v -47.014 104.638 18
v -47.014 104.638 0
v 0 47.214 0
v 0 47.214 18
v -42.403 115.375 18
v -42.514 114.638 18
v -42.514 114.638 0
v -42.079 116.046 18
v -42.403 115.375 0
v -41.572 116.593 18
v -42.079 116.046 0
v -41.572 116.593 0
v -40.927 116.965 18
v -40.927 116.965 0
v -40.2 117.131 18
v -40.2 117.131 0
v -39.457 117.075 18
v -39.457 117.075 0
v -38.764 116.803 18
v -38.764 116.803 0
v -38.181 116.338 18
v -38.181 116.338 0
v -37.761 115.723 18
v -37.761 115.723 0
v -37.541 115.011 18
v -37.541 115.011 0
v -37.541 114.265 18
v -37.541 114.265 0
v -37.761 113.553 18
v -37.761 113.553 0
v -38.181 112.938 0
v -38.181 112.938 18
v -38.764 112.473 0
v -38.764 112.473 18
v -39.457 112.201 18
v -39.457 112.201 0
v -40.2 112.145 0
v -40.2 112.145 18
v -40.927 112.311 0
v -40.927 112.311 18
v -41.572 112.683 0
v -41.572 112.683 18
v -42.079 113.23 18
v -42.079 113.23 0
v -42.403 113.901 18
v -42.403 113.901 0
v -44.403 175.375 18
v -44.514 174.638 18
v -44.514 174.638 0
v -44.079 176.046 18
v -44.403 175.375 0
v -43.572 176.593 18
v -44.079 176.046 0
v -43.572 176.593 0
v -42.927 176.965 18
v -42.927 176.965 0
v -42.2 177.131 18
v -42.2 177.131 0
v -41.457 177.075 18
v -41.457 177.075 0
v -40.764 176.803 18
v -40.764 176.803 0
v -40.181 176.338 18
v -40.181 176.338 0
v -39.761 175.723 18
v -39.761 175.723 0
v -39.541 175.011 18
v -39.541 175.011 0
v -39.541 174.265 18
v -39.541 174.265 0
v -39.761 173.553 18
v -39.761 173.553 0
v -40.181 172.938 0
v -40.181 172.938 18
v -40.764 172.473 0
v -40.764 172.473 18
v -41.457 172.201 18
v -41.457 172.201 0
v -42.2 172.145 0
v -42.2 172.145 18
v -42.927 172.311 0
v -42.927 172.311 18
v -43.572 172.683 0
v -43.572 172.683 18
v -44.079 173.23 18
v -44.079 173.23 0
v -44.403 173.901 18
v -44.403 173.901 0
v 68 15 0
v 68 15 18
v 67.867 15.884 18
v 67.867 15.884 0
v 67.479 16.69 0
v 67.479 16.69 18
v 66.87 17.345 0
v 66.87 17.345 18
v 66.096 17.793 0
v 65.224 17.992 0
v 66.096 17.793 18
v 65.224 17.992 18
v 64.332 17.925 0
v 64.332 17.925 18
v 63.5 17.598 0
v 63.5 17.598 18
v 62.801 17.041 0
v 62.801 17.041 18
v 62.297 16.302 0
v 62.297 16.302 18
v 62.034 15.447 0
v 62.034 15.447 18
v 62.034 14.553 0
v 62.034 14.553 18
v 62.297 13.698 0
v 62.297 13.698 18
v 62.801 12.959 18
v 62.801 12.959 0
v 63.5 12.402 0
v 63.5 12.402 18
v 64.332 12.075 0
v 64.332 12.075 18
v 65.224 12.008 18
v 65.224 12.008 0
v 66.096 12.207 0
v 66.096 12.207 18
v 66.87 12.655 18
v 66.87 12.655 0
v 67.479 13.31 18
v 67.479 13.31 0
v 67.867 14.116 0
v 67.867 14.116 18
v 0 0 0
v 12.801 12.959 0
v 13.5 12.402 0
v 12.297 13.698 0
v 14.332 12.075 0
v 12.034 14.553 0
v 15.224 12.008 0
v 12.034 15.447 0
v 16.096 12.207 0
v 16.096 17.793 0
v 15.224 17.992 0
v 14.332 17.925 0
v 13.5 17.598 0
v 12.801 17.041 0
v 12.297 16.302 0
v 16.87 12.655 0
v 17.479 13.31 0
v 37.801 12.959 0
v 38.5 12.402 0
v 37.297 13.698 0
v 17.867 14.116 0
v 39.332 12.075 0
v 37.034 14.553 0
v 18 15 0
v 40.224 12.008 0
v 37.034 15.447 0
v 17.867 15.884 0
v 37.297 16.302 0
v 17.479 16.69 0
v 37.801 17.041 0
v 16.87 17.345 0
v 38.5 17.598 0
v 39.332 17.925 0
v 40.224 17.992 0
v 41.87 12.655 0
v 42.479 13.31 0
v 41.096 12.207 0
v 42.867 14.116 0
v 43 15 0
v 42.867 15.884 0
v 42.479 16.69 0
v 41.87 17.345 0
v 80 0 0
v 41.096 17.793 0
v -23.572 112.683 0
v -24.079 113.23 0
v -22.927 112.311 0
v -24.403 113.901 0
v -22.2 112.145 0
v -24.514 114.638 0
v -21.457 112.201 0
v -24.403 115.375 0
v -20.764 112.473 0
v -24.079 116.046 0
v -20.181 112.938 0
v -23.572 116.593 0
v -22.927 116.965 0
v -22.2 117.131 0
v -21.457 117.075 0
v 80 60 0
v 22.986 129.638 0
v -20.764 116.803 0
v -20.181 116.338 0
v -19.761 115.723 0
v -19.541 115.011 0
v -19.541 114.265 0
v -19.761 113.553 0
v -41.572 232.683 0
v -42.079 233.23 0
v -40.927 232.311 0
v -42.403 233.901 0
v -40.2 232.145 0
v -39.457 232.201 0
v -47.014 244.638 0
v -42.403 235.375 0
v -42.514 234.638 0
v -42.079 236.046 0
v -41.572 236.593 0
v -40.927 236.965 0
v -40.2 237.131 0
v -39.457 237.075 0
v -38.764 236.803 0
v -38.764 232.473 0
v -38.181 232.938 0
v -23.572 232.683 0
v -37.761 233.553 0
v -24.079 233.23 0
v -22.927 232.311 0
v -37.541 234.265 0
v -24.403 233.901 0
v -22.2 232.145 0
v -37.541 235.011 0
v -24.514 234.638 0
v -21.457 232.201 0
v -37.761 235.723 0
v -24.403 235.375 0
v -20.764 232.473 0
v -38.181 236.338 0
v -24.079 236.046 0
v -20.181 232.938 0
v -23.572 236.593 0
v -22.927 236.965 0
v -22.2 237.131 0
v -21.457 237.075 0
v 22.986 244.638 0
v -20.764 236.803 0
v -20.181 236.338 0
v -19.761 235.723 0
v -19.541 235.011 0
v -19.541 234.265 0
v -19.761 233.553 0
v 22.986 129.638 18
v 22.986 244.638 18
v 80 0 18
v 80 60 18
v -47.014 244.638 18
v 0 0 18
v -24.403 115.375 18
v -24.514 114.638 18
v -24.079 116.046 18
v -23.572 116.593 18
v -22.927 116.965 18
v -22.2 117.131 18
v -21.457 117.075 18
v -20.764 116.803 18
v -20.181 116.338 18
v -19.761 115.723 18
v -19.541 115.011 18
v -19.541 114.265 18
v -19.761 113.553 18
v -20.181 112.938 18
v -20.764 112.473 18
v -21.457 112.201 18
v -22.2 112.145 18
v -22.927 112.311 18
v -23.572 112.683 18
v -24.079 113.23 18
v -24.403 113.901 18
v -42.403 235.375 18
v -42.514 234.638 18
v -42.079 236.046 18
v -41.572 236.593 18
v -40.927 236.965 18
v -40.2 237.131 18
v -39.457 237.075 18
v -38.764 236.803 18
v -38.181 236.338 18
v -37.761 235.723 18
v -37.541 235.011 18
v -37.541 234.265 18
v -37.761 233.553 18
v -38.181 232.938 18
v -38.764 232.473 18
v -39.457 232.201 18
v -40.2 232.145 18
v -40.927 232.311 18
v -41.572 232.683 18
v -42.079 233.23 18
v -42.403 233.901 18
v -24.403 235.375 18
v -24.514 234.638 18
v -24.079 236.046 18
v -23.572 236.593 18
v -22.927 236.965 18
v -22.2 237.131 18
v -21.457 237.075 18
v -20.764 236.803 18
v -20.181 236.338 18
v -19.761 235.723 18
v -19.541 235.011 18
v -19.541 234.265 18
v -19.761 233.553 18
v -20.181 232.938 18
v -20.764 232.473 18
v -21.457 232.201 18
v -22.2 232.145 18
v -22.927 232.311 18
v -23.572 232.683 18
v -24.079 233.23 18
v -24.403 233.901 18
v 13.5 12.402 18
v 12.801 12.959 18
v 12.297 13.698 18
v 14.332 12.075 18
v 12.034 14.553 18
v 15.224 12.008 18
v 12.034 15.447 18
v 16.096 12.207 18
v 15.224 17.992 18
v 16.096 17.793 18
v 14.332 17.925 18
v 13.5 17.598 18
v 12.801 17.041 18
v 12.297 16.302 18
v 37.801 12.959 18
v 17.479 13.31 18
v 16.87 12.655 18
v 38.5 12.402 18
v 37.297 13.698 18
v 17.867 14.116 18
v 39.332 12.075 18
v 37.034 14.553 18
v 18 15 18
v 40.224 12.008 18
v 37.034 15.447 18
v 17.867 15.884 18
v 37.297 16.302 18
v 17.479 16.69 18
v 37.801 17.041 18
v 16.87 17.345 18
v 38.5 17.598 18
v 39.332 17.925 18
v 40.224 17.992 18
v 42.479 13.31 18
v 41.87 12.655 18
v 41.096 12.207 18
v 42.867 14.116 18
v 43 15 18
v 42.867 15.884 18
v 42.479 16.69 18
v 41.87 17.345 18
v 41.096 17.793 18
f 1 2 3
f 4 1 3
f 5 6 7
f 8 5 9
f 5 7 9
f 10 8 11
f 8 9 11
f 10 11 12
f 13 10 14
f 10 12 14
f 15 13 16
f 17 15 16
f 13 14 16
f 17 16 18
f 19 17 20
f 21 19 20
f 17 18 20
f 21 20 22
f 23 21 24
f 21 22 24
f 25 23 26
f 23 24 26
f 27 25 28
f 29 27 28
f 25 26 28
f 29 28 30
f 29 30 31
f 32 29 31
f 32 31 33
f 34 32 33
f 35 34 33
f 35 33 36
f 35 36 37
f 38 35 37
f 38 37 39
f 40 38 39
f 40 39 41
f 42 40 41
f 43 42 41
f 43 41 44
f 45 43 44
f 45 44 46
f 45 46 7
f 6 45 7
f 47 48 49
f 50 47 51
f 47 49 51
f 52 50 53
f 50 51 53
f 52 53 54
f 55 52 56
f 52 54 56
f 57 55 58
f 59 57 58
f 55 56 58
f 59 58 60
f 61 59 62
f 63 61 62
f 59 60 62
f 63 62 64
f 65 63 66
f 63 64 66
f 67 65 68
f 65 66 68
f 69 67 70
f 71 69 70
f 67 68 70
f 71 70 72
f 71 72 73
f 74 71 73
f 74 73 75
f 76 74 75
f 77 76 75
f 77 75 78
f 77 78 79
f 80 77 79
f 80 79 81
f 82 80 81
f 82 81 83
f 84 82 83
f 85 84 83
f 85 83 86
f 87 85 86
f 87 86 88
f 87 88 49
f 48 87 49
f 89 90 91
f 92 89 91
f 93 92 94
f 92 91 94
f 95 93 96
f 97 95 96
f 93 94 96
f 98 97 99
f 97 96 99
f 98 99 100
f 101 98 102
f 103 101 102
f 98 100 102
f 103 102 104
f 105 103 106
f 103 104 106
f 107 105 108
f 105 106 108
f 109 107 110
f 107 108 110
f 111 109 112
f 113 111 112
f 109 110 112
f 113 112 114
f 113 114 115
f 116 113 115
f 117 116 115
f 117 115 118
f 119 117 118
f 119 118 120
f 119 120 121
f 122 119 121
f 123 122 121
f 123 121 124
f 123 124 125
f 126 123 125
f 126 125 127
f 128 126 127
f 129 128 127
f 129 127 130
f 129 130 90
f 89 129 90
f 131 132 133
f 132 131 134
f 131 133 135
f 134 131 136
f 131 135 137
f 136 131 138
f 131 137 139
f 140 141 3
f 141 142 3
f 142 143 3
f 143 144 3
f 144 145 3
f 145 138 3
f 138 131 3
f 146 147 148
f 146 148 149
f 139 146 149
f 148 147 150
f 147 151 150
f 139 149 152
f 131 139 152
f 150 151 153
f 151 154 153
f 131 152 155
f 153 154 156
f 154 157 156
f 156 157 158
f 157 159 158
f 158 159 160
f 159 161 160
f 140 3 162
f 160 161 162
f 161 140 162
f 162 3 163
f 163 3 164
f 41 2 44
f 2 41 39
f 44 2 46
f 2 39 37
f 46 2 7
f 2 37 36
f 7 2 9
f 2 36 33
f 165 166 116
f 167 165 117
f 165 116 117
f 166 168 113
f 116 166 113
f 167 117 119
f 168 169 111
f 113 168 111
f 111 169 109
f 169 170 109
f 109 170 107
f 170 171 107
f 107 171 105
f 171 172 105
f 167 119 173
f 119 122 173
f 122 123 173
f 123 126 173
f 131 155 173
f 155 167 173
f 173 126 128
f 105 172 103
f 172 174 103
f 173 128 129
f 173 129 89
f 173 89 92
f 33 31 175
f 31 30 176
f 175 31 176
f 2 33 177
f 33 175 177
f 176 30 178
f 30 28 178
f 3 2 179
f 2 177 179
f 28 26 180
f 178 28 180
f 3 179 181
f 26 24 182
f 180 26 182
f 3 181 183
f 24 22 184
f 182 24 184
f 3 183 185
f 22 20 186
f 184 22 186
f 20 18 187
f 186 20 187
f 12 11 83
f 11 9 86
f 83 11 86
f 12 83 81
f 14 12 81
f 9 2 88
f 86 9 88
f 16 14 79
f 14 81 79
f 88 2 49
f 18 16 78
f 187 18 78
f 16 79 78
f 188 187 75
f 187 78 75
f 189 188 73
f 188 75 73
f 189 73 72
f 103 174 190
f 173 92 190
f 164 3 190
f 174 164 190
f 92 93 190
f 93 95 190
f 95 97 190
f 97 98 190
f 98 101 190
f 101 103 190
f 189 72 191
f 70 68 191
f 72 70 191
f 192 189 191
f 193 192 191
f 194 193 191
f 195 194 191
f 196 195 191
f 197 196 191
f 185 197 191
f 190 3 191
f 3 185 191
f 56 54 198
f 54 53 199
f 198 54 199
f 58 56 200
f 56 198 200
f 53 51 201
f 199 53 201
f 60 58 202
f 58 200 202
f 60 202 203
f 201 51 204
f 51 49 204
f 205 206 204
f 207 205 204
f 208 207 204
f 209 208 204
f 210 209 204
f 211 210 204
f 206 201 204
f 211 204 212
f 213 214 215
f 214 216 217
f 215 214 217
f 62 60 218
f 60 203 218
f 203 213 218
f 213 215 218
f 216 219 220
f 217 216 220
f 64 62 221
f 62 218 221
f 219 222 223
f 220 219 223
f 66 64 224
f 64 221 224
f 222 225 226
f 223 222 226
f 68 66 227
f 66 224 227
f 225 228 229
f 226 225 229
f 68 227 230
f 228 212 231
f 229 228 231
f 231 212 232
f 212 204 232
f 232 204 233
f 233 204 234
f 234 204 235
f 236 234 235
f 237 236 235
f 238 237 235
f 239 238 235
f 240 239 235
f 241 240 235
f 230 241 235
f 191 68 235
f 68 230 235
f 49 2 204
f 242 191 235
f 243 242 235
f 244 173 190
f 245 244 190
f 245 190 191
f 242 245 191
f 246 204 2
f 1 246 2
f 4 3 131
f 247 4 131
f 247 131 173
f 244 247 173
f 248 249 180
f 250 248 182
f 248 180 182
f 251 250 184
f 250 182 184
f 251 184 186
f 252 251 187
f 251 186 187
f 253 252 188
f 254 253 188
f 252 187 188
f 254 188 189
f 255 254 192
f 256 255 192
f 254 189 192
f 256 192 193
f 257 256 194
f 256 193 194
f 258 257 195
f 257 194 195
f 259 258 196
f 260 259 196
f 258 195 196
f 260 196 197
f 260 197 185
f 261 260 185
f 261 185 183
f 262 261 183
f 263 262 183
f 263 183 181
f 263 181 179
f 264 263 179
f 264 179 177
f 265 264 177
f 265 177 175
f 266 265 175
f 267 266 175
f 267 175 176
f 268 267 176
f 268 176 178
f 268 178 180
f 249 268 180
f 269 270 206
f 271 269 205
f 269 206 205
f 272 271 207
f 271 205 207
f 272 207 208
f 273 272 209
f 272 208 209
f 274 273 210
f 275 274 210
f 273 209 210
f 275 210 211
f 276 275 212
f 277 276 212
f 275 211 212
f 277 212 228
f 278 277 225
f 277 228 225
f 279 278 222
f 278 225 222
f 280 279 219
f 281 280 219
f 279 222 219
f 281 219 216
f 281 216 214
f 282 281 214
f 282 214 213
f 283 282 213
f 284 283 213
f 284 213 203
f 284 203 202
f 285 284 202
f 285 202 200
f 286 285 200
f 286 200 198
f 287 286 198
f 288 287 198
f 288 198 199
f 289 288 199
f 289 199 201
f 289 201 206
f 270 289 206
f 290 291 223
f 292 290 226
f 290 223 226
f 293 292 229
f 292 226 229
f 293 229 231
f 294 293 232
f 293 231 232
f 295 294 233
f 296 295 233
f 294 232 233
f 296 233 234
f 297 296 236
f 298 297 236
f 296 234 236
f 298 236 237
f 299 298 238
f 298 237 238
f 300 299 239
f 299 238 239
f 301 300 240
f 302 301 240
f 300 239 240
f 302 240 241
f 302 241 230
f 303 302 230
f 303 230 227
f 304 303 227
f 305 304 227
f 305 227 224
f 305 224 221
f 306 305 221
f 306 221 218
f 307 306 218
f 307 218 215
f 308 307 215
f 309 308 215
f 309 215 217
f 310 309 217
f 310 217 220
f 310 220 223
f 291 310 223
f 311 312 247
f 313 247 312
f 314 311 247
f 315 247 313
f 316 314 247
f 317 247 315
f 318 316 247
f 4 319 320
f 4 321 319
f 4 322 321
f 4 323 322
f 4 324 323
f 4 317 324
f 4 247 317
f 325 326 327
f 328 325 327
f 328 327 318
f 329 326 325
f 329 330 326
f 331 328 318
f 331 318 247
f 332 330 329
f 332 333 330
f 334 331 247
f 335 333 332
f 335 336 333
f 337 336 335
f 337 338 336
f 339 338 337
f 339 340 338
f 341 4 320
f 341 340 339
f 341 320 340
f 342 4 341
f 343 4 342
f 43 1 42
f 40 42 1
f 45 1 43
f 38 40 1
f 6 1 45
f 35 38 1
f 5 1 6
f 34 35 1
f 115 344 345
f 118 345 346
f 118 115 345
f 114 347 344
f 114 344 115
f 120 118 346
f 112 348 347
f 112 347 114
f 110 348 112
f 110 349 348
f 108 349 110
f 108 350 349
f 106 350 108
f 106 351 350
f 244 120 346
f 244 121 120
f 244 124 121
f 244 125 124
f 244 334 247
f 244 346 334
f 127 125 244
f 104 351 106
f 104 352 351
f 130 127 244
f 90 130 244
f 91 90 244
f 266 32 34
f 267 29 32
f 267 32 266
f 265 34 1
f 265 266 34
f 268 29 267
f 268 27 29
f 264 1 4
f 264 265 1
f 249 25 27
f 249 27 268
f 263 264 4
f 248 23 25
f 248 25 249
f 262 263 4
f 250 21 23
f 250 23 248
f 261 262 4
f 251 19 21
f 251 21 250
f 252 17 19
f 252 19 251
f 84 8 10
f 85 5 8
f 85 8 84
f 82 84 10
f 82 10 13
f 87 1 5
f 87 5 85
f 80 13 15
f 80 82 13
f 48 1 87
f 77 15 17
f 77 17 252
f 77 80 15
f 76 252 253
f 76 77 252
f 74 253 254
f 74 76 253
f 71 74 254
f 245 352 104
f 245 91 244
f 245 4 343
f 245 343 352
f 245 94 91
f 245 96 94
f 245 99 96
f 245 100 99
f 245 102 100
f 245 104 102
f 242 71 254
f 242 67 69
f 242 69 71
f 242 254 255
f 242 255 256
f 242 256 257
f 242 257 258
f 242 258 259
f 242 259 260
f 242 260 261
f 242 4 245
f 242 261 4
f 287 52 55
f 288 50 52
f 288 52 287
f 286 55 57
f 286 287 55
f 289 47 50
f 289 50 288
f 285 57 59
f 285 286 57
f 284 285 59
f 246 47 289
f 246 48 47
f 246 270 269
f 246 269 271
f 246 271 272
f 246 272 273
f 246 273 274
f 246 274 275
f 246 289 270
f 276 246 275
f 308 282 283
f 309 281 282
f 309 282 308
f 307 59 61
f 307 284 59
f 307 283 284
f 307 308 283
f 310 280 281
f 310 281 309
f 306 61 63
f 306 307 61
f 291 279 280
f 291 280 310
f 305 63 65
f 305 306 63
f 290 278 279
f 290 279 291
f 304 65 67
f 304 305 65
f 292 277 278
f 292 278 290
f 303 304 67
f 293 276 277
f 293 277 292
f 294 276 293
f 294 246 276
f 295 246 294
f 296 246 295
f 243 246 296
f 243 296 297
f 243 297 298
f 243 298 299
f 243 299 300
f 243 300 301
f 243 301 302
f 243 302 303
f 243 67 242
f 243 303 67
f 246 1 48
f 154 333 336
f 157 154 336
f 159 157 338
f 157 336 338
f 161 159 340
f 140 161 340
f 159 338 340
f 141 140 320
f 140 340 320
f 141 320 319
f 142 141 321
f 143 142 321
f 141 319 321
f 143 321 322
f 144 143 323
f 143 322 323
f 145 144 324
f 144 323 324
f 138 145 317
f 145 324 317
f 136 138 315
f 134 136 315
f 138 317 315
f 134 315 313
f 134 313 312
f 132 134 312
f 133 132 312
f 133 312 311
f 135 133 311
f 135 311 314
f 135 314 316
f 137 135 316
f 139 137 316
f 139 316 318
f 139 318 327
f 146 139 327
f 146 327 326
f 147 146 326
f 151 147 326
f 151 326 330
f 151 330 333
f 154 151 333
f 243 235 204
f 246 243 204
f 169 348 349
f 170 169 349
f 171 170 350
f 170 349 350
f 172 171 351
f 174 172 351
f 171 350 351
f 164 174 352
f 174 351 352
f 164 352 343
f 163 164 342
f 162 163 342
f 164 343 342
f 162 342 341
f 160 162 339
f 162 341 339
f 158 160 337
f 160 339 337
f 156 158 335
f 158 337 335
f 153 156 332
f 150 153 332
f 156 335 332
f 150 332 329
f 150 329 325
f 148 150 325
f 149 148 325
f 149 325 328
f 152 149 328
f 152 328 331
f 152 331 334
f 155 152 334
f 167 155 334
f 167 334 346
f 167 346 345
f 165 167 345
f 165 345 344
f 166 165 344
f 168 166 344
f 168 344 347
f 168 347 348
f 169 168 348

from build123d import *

# Parameters (mm, degrees)
EXTRUDE_1_DEPTH     = 18
HOLE_WIZARD_M6_1_D  = 5
SKETCH_7_R          = 3
CUT_EXTRUDE_1_DEPTH = 259.015029546
HOLE_WIZARD_M6_2_D  = 5


with BuildPart() as part:
    # 草图1 → 凸台-拉伸1 (new body)
    with BuildSketch(Plane.XY):
        Polygon((0, 0), (80, 0), (80, 60), (22.986425339, 129.63800905), (22.986425339, 244.63800905), (-47.013574661, 244.63800905), (-47.013574661, 104.63800905), (0, 47.214285714), align=None)
    extrude(amount=EXTRUDE_1_DEPTH)

    # M6 螺纹孔1 (through all)
    with Locations(Plane.XY.offset(18)):
        with Locations((-40.013574661, 114.63800905), (-22.013574661, 114.63800905), (-40.013574661, 234.63800905), (-22.013574661, 234.63800905)):
            Hole(HOLE_WIZARD_M6_1_D / 2)

    # 草图7 → 切除-拉伸1 (cut, through all)
    with BuildSketch(Plane.XY.offset(18)):
        with Locations((15, 15)):
            Circle(SKETCH_7_R)
        with Locations((40, 15)):
            Circle(SKETCH_7_R)
        with Locations((65, 15)):
            Circle(SKETCH_7_R)
    extrude(amount=-CUT_EXTRUDE_1_DEPTH, mode=Mode.SUBTRACT)

    # M6 螺纹孔2 (through all)
    with Locations(Plane(origin=(-42.013574661, 174.63800905, 18), x_dir=(1, 0, 0), z_dir=(0, 0, 1))):
        with Locations((0, 0)):
            Hole(HOLE_WIZARD_M6_2_D / 2)


solid = part.part
